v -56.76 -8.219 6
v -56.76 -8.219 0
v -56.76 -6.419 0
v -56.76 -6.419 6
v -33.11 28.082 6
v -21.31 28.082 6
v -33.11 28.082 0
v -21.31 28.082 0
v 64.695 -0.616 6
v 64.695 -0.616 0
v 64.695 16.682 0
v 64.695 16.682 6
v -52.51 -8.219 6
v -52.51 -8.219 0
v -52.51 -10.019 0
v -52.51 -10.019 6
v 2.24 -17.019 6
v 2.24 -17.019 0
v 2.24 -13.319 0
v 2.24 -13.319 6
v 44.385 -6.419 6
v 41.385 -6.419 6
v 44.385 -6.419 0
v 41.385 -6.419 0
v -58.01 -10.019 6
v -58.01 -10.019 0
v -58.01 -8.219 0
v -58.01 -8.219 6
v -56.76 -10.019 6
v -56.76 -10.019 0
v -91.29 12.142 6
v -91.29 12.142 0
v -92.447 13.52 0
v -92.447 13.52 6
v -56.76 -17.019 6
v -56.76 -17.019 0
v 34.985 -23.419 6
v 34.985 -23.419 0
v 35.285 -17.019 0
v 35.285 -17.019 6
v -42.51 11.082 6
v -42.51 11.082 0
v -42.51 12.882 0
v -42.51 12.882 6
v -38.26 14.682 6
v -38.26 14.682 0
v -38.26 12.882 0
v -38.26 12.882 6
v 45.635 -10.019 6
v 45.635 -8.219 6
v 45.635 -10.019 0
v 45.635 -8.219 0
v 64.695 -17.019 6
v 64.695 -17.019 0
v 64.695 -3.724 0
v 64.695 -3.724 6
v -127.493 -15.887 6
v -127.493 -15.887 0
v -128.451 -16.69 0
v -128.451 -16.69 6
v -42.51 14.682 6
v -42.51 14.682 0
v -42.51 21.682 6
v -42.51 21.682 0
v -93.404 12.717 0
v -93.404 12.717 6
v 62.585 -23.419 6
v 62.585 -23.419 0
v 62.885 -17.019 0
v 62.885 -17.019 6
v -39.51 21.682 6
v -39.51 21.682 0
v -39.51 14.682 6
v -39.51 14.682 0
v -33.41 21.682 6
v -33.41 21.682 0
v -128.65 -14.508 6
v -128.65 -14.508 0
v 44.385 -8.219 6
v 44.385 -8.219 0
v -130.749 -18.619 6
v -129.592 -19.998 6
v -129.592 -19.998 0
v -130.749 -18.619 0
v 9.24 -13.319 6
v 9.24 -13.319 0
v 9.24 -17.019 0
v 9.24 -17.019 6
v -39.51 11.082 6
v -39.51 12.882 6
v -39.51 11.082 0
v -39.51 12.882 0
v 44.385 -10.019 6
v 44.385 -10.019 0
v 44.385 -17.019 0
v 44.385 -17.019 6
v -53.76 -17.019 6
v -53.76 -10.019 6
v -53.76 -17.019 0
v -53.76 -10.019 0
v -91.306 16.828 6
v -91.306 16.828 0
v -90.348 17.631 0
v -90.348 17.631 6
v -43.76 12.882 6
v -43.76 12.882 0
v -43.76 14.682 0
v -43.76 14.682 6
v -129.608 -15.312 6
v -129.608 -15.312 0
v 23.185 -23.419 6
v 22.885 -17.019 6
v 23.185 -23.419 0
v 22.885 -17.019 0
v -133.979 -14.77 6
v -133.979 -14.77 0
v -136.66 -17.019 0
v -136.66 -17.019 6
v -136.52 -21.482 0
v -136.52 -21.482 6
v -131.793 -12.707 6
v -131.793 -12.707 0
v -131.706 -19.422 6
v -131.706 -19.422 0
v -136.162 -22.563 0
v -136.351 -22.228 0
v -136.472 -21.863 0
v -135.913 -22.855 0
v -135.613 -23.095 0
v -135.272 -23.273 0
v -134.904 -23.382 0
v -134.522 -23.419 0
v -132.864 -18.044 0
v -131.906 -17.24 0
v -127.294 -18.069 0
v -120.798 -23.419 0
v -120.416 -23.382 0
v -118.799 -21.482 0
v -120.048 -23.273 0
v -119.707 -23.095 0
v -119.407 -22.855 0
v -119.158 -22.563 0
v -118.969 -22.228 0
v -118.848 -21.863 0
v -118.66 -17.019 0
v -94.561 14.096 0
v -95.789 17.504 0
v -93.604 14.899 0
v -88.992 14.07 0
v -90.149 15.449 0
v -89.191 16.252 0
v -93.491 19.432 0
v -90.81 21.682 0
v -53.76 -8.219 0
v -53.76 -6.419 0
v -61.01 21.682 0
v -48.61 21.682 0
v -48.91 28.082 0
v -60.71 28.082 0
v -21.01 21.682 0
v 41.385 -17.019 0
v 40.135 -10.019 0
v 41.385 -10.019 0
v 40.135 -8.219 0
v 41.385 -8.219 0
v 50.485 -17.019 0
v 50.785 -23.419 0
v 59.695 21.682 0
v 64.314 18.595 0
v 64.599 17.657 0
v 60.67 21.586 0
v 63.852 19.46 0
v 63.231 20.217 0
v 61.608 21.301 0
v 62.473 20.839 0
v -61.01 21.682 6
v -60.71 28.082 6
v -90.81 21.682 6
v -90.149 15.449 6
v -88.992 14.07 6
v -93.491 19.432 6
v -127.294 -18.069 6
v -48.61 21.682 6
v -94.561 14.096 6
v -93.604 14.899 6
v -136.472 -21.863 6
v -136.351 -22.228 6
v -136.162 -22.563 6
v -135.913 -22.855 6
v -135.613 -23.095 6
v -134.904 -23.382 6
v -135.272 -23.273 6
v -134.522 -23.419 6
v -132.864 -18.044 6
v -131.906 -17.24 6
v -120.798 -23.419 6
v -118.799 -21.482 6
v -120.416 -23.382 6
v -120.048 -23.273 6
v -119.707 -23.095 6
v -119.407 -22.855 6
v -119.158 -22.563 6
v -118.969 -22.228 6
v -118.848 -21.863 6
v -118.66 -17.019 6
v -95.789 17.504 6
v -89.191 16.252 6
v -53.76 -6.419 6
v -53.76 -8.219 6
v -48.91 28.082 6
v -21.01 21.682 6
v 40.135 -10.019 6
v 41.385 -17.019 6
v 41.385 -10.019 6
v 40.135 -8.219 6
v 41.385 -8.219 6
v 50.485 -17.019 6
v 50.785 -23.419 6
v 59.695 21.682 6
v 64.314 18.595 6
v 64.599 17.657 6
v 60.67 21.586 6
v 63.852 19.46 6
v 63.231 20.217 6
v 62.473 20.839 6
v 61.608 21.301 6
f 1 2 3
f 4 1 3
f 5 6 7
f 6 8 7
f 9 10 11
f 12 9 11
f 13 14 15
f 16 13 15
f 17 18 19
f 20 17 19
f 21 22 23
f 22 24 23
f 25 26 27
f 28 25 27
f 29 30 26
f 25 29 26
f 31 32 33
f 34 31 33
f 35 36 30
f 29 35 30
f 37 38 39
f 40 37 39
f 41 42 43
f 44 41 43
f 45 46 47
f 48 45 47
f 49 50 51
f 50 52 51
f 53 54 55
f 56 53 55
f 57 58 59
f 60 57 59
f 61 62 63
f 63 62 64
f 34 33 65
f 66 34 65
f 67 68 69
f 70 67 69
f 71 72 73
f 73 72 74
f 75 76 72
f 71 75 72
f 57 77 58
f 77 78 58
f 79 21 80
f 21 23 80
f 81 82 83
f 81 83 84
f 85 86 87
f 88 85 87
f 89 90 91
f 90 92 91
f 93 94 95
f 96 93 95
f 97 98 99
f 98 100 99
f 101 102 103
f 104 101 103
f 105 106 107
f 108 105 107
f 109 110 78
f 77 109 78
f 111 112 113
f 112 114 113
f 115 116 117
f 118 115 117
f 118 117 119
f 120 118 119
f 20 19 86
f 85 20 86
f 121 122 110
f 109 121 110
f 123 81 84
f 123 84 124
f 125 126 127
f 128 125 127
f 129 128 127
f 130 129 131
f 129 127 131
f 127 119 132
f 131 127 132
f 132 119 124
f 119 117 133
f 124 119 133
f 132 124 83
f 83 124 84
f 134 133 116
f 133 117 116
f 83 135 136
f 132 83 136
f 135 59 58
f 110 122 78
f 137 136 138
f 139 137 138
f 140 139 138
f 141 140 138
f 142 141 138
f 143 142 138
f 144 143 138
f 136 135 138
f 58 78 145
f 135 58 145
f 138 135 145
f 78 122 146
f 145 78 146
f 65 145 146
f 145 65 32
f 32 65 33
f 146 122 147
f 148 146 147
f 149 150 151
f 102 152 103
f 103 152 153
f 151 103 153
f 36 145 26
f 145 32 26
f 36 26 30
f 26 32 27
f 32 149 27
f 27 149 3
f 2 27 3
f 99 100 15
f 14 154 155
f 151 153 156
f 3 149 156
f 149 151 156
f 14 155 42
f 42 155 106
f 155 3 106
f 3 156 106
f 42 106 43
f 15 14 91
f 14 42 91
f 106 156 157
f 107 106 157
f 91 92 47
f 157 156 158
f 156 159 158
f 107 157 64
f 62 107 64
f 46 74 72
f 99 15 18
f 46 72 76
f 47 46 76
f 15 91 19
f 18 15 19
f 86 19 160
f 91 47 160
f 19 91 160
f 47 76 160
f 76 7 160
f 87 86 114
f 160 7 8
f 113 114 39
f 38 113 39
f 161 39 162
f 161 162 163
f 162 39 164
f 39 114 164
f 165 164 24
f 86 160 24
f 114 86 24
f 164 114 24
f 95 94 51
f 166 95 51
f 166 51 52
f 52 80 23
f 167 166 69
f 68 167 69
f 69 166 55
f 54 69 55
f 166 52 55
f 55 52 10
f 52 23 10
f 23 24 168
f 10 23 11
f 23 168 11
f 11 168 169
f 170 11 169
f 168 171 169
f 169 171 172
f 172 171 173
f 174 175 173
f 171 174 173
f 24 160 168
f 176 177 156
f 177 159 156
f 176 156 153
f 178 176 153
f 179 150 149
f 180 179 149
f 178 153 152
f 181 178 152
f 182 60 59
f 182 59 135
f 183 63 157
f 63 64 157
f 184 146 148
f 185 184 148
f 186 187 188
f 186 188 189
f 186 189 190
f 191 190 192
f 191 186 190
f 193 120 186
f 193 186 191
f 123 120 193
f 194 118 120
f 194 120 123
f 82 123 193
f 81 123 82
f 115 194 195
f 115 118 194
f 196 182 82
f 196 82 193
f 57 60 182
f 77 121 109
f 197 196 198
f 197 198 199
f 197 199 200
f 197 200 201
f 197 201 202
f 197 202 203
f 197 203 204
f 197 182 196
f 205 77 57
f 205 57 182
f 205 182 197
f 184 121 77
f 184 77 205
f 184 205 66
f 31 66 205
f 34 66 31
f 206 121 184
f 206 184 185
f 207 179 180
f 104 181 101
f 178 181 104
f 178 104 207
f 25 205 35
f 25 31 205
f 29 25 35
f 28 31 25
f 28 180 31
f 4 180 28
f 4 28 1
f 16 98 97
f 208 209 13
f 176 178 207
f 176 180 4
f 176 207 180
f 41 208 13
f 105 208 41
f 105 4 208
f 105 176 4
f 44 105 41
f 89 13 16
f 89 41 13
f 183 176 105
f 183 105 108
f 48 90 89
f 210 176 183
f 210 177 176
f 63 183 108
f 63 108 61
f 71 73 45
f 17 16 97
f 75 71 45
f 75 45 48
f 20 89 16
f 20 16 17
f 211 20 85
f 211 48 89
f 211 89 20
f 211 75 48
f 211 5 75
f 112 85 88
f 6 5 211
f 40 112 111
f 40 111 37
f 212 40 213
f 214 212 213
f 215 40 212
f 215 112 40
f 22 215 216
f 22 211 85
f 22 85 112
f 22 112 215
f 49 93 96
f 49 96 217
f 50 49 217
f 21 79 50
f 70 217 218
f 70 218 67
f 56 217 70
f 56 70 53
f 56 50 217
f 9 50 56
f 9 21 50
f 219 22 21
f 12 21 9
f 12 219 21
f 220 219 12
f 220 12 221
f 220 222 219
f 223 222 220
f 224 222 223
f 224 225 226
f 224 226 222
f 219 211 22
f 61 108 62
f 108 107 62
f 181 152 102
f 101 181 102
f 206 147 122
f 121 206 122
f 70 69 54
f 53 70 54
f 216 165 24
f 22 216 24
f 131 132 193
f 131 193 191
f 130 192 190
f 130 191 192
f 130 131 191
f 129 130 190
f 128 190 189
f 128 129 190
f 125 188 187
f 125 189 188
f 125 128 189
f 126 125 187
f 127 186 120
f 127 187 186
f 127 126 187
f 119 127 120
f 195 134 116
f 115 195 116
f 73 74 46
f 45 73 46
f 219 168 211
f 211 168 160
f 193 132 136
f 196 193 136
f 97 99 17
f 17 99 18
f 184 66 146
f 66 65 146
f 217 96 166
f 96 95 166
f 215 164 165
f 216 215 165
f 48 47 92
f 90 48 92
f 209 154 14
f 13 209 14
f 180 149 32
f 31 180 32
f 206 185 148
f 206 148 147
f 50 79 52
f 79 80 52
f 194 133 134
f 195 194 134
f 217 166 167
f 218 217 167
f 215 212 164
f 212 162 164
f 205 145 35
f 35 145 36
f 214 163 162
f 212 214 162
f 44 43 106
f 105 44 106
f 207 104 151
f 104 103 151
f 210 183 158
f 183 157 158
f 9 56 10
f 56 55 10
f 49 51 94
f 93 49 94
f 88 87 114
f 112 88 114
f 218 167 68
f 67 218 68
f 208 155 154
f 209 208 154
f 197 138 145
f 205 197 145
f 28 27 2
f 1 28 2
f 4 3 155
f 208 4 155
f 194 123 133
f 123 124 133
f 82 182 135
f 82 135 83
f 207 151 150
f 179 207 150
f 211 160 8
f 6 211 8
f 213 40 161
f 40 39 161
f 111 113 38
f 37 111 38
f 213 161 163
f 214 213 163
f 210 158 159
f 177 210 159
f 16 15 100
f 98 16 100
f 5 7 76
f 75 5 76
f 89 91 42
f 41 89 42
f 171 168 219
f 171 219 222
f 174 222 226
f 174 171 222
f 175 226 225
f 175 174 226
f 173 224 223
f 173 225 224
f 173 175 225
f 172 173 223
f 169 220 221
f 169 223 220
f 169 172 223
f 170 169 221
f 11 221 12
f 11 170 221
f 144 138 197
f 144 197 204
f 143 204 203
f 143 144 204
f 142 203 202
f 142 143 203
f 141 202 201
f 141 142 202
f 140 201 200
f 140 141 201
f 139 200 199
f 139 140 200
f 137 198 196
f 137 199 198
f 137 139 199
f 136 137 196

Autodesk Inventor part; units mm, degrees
ref_plane "YZ Plane" through (0, 0, 0) normal (1, 0, 0) x (0, 1, 0)
ref_plane "XZ Plane" through (0, 0, 0) normal (0, 1, 0) x (-1, 0, 0)
ref_plane "XY Plane" through (0, 0, 0) normal (0, 0, 1) x (1, 0, 0)
sketch "Sketch1" plane through (0, 0, 0) normal (0, 0, 1) x (1, 0, 0)
  line L0 (-39.5101, 21.6819) -> (-39.5101, 14.6819)
  line L1 (-39.5101, 14.6819) -> (-38.2601, 14.6819)
  line L2 (-38.2601, 14.6819) -> (-38.2601, 12.8819)
  line L3 (-38.2601, 12.8819) -> (-39.5101, 12.8819)
  line L4 (-39.5101, 12.8819) -> (-39.5101, 11.0819)
  line L5 (-39.5101, 11.0819) -> (-42.5101, 11.0819)
  line L6 (-42.5101, 11.0819) -> (-42.5101, 12.8819)
  line L7 (-42.5101, 12.8819) -> (-43.7601, 12.8819)
  line L8 (-43.7601, 12.8819) -> (-43.7601, 14.6819)
  line L9 (-43.7601, 14.6819) -> (-42.5101, 14.6819)
  line L10 (-42.5101, 14.6819) -> (-42.5101, 21.6819)
  line L11 (-42.5101, 21.6819) -> (-48.6101, 21.6819)
  line L12 (-48.6101, 21.6819) -> (-48.9101, 28.0819)
  line L13 (-48.9101, 28.0819) -> (-60.7101, 28.0819)
  line L14 (-60.7101, 28.0819) -> (-61.0101, 21.6819)
  line L15 (-61.0101, 21.6819) -> (-90.8101, 21.6819)
  line L16 (-90.8101, 21.6819) -> (-93.4912, 19.4321)
  line L17 (-93.4912, 19.4321) -> (-91.3057, 16.8276)
  line L18 (-91.3057, 16.8276) -> (-90.3482, 17.6311)
  line L19 (-90.3482, 17.6311) -> (-89.1912, 16.2522)
  line L20 (-89.1912, 16.2522) -> (-90.1487, 15.4487)
  line L21 (-90.1487, 15.4487) -> (-88.9917, 14.0698)
  line L22 (-88.9917, 14.0698) -> (-91.2898, 12.1415)
  line L23 (-91.2898, 12.1415) -> (-92.4469, 13.5203)
  line L24 (-92.4469, 13.5203) -> (-93.4044, 12.7169)
  line L25 (-93.4044, 12.7169) -> (-94.5614, 14.0957)
  line L26 (-94.5614, 14.0957) -> (-93.6039, 14.8992)
  line L27 (-93.6039, 14.8992) -> (-95.7894, 17.5038)
  line L28 (-95.7894, 17.5038) -> (-131.7932, -12.7071)
  line L29 (-131.7932, -12.7071) -> (-129.6078, -15.3116)
  line L30 (-129.6078, -15.3116) -> (-128.6502, -14.5082)
  line L31 (-128.6502, -14.5082) -> (-127.4932, -15.887)
  line L32 (-127.4932, -15.887) -> (-128.4508, -16.6905)
  line L33 (-128.4508, -16.6905) -> (-127.2937, -18.0694)
  line L34 (-127.2937, -18.0694) -> (-129.5919, -19.9978)
  line L35 (-129.5919, -19.9978) -> (-130.7489, -18.6189)
  line L36 (-130.7489, -18.6189) -> (-131.7064, -19.4224)
  line L37 (-131.7064, -19.4224) -> (-132.8635, -18.0435)
  line L38 (-132.8635, -18.0435) -> (-131.9059, -17.24)
  line L39 (-131.9059, -17.24) -> (-133.9788, -14.7696)
  line L40 (-133.9788, -14.7696) -> (-136.66, -17.0193)
  line L41 (-136.66, -17.0193) -> (-136.5205, -21.4818)
  arc A0 (-136.5205, -21.4818) -> (-134.5215, -23.4193) centre (-134.5215, -21.4193) ccw
  line L42 (-134.5215, -23.4193) -> (-120.7985, -23.4193)
  arc A1 (-120.7985, -23.4193) -> (-118.7994, -21.4818) centre (-120.7985, -21.4193) ccw
  line L43 (-118.7994, -21.4818) -> (-118.66, -17.0193)
  line L44 (-118.66, -17.0193) -> (-56.7602, -17.0193)
  line L45 (-56.7602, -17.0193) -> (-56.7602, -10.0193)
  line L46 (-56.7602, -10.0193) -> (-58.0102, -10.0193)
  line L47 (-58.0102, -10.0193) -> (-58.0102, -8.2193)
  line L48 (-58.0102, -8.2193) -> (-56.7602, -8.2193)
  line L49 (-56.7602, -8.2193) -> (-56.7602, -6.4193)
  line L50 (-56.7602, -6.4193) -> (-53.7602, -6.4193)
  line L51 (-53.7602, -6.4193) -> (-53.7602, -8.2193)
  line L52 (-53.7602, -8.2193) -> (-52.5102, -8.2193)
  line L53 (-52.5102, -8.2193) -> (-52.5102, -10.0193)
  line L54 (-52.5102, -10.0193) -> (-53.7602, -10.0193)
  line L55 (-53.7602, -10.0193) -> (-53.7602, -17.0193)
  line L56 (-53.7602, -17.0193) -> (2.24, -17.0193)
  line L57 (2.24, -17.0193) -> (2.24, -13.3193)
  line L58 (2.24, -13.3193) -> (9.24, -13.3193)
  line L59 (9.24, -13.3193) -> (9.24, -17.0193)
  line L60 (9.24, -17.0193) -> (22.885, -17.0193)
  line L61 (22.885, -17.0193) -> (23.185, -23.4193)
  line L62 (23.185, -23.4193) -> (34.985, -23.4193)
  line L63 (34.985, -23.4193) -> (35.285, -17.0193)
  line L64 (35.285, -17.0193) -> (41.385, -17.0193)
  line L65 (41.385, -17.0193) -> (41.385, -10.0193)
  line L66 (41.385, -10.0193) -> (40.135, -10.0193)
  line L67 (40.135, -10.0193) -> (40.135, -8.2193)
  line L68 (40.135, -8.2193) -> (41.385, -8.2193)
  line L69 (41.385, -8.2193) -> (41.385, -6.4193)
  line L70 (41.385, -6.4193) -> (44.385, -6.4193)
  line L71 (44.385, -6.4193) -> (44.385, -8.2193)
  line L72 (44.385, -8.2193) -> (45.635, -8.2193)
  line L73 (45.635, -8.2193) -> (45.635, -10.0193)
  line L74 (45.635, -10.0193) -> (44.385, -10.0193)
  line L75 (44.385, -10.0193) -> (44.385, -17.0193)
  line L76 (44.385, -17.0193) -> (50.485, -17.0193)
  line L77 (50.485, -17.0193) -> (50.785, -23.4193)
  line L78 (50.785, -23.4193) -> (62.585, -23.4193)
  line L79 (62.585, -23.4193) -> (62.885, -17.0193)
  line L80 (62.885, -17.0193) -> (64.695, -17.0193)
  line L81 (64.695, -17.0193) -> (64.695, -3.7245)
  line L82 (64.695, -3.7245) -> (64.695, -0.6157)
  line L83 (64.695, -0.6157) -> (64.695, 16.6819)
  arc A2 (64.695, 16.6819) -> (59.695, 21.6819) centre (59.695, 16.6819) ccw
  line L84 (59.695, 21.6819) -> (-21.0101, 21.6819)
  line L85 (-21.0101, 21.6819) -> (-21.3101, 28.0819)
  line L86 (-21.3101, 28.0819) -> (-33.1101, 28.0819)
  line L87 (-33.1101, 28.0819) -> (-33.4101, 21.6819)
  line L88 (-33.4101, 21.6819) -> (-39.5101, 21.6819)
  point P0 (0, 0)
  point P1 (0, 0)
extrude "Extrusion1" add sketch "Sketch1" along normal blind 6
properties part number "boardCaseSide"
